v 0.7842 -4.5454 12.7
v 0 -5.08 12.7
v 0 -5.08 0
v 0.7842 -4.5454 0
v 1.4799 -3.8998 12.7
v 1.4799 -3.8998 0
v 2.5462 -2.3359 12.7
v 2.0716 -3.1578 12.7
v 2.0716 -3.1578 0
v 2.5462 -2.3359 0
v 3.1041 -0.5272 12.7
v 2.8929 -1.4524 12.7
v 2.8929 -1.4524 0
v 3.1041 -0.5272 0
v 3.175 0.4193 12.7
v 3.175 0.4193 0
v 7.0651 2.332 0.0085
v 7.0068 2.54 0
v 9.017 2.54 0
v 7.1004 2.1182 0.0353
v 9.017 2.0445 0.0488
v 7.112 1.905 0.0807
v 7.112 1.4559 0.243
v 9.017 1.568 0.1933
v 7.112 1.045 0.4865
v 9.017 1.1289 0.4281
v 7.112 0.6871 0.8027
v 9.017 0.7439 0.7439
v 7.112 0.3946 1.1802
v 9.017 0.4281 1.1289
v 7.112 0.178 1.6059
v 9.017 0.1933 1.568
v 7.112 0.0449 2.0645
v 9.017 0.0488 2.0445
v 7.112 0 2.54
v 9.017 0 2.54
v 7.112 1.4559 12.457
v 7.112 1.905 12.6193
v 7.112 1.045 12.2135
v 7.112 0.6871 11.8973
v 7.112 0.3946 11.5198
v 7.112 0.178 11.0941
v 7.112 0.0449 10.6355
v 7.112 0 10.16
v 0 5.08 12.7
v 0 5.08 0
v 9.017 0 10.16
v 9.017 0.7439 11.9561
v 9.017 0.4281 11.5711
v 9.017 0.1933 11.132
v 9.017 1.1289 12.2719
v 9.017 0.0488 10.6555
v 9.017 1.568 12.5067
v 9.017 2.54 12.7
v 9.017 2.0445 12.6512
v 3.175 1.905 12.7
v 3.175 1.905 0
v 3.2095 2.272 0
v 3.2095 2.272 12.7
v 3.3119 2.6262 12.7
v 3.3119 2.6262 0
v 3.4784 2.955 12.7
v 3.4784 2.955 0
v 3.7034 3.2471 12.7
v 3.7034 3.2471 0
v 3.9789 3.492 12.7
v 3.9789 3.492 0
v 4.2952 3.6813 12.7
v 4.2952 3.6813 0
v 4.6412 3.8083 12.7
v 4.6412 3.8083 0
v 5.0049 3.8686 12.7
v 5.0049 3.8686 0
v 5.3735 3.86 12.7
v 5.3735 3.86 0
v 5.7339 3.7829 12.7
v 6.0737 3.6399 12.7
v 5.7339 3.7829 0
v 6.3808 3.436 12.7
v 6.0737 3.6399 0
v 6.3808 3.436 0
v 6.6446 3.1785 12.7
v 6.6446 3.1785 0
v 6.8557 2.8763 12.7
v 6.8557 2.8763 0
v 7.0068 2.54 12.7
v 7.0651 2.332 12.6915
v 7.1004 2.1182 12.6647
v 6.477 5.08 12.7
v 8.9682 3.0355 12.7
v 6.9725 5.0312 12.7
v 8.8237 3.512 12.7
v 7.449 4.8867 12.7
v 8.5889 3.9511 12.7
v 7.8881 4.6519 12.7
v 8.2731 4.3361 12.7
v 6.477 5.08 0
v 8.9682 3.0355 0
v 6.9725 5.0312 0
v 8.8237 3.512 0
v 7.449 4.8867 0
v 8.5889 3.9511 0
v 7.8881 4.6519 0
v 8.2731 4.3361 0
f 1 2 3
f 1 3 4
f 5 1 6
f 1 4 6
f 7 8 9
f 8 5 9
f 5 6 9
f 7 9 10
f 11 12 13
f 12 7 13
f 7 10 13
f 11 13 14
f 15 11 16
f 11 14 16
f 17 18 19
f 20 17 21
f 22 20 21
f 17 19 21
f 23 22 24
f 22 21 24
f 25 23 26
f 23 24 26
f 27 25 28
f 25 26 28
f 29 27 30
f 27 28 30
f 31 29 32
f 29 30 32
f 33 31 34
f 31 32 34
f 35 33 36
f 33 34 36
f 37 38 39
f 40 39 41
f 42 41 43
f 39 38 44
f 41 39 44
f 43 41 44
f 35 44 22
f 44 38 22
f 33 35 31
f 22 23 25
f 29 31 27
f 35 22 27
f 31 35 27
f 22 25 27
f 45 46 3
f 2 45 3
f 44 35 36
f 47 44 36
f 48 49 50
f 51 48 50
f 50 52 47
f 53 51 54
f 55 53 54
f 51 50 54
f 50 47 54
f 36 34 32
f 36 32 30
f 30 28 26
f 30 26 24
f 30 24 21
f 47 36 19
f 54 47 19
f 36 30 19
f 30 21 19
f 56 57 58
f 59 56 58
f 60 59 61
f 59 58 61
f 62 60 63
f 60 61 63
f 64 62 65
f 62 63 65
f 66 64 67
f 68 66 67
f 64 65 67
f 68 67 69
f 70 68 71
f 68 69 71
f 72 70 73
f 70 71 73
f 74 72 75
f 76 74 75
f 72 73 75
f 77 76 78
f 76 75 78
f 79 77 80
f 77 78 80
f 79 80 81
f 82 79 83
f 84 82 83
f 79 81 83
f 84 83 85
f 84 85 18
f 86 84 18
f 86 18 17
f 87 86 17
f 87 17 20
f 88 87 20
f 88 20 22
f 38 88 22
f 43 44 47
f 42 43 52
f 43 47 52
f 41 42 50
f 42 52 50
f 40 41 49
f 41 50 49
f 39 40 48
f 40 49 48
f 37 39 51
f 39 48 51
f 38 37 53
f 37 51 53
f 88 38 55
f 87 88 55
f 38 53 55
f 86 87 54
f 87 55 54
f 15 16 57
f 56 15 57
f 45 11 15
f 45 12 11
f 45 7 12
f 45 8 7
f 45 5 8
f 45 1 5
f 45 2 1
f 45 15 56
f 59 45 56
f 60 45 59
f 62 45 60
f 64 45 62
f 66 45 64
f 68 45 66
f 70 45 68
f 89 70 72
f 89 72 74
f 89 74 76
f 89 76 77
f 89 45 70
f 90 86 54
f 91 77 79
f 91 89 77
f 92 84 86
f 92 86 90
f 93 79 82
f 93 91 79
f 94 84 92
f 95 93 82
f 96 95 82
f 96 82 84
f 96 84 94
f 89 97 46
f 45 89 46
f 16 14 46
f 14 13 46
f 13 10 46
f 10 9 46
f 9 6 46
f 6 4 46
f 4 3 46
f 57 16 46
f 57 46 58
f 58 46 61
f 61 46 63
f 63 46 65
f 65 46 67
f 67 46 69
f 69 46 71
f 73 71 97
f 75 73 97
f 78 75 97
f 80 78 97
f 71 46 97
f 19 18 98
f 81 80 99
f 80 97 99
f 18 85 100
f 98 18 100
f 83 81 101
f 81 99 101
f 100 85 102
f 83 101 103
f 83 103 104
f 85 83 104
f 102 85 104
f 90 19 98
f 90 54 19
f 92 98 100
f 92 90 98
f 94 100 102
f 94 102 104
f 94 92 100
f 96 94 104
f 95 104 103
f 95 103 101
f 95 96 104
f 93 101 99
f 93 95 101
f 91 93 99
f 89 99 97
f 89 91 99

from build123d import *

# Parameters (mm, degrees)
F1_DEPTH    = 12.7
F2_R        = 2.54
F3_T1_DEPTH = 40.1963065702
F4_R        = 2.54


# Not quite as in the source:
# - a fillet or chamfer that OpenCascade refuses, or shapes differently, is made with other operations: its cross-section is extruded or revolved along the edge and cut away or added


with BuildPart() as f1:
    # F0 (on Top) → F1 (new body)
    with BuildSketch(Plane.XY):
        with BuildLine():
            Line((0, 5.08), (0, -5.08))
            Line((0, -5.08), (3.175, -5.08))
            Line((3.175, -5.08), (3.175, 1.905))
            ThreePointArc((3.175, 1.905), (5.1435, 3.8735), (7.112, 1.905))
            Line((7.112, 1.905), (7.112, 0))
            Line((7.112, 0), (9.017, 0))
            Line((9.017, 0), (9.017, 5.08))
            Line((9.017, 5.08), (0, 5.08))
        make_face()
    extrude(amount=F1_DEPTH)

    # F2
    f2_edges = [f1.edges().sort_by_distance(p)[0] for p in [
        (9.017, 5.08, 6.35),
    ]]
    fillet(f2_edges, radius=F2_R)

    # F3: fillet of radius 6.35 on 1 edges, made by hand

    # F3_s2 → F3_t1 (cut)
    with BuildSketch(Plane.XY.offset(-13.7481532851)):
        with BuildLine():
            ThreePointArc((0, -5.08), (2.324261314, -2.755738686), (3.175, 0.419261314))
            Line((3.175, 0.419261314), (3.175, -5.08))
            Line((3.175, -5.08), (0, -5.08))
        make_face()
    extrude(amount=F3_T1_DEPTH, mode=Mode.SUBTRACT)

    # F4
    f4_edges = [f1.edges().sort_by_distance(p)[0] for p in [
        (8.0645, 0, 12.7),
        (8.0645, 0, 0),
    ]]
    fillet(f4_edges, radius=F4_R)


solid = f1.part
